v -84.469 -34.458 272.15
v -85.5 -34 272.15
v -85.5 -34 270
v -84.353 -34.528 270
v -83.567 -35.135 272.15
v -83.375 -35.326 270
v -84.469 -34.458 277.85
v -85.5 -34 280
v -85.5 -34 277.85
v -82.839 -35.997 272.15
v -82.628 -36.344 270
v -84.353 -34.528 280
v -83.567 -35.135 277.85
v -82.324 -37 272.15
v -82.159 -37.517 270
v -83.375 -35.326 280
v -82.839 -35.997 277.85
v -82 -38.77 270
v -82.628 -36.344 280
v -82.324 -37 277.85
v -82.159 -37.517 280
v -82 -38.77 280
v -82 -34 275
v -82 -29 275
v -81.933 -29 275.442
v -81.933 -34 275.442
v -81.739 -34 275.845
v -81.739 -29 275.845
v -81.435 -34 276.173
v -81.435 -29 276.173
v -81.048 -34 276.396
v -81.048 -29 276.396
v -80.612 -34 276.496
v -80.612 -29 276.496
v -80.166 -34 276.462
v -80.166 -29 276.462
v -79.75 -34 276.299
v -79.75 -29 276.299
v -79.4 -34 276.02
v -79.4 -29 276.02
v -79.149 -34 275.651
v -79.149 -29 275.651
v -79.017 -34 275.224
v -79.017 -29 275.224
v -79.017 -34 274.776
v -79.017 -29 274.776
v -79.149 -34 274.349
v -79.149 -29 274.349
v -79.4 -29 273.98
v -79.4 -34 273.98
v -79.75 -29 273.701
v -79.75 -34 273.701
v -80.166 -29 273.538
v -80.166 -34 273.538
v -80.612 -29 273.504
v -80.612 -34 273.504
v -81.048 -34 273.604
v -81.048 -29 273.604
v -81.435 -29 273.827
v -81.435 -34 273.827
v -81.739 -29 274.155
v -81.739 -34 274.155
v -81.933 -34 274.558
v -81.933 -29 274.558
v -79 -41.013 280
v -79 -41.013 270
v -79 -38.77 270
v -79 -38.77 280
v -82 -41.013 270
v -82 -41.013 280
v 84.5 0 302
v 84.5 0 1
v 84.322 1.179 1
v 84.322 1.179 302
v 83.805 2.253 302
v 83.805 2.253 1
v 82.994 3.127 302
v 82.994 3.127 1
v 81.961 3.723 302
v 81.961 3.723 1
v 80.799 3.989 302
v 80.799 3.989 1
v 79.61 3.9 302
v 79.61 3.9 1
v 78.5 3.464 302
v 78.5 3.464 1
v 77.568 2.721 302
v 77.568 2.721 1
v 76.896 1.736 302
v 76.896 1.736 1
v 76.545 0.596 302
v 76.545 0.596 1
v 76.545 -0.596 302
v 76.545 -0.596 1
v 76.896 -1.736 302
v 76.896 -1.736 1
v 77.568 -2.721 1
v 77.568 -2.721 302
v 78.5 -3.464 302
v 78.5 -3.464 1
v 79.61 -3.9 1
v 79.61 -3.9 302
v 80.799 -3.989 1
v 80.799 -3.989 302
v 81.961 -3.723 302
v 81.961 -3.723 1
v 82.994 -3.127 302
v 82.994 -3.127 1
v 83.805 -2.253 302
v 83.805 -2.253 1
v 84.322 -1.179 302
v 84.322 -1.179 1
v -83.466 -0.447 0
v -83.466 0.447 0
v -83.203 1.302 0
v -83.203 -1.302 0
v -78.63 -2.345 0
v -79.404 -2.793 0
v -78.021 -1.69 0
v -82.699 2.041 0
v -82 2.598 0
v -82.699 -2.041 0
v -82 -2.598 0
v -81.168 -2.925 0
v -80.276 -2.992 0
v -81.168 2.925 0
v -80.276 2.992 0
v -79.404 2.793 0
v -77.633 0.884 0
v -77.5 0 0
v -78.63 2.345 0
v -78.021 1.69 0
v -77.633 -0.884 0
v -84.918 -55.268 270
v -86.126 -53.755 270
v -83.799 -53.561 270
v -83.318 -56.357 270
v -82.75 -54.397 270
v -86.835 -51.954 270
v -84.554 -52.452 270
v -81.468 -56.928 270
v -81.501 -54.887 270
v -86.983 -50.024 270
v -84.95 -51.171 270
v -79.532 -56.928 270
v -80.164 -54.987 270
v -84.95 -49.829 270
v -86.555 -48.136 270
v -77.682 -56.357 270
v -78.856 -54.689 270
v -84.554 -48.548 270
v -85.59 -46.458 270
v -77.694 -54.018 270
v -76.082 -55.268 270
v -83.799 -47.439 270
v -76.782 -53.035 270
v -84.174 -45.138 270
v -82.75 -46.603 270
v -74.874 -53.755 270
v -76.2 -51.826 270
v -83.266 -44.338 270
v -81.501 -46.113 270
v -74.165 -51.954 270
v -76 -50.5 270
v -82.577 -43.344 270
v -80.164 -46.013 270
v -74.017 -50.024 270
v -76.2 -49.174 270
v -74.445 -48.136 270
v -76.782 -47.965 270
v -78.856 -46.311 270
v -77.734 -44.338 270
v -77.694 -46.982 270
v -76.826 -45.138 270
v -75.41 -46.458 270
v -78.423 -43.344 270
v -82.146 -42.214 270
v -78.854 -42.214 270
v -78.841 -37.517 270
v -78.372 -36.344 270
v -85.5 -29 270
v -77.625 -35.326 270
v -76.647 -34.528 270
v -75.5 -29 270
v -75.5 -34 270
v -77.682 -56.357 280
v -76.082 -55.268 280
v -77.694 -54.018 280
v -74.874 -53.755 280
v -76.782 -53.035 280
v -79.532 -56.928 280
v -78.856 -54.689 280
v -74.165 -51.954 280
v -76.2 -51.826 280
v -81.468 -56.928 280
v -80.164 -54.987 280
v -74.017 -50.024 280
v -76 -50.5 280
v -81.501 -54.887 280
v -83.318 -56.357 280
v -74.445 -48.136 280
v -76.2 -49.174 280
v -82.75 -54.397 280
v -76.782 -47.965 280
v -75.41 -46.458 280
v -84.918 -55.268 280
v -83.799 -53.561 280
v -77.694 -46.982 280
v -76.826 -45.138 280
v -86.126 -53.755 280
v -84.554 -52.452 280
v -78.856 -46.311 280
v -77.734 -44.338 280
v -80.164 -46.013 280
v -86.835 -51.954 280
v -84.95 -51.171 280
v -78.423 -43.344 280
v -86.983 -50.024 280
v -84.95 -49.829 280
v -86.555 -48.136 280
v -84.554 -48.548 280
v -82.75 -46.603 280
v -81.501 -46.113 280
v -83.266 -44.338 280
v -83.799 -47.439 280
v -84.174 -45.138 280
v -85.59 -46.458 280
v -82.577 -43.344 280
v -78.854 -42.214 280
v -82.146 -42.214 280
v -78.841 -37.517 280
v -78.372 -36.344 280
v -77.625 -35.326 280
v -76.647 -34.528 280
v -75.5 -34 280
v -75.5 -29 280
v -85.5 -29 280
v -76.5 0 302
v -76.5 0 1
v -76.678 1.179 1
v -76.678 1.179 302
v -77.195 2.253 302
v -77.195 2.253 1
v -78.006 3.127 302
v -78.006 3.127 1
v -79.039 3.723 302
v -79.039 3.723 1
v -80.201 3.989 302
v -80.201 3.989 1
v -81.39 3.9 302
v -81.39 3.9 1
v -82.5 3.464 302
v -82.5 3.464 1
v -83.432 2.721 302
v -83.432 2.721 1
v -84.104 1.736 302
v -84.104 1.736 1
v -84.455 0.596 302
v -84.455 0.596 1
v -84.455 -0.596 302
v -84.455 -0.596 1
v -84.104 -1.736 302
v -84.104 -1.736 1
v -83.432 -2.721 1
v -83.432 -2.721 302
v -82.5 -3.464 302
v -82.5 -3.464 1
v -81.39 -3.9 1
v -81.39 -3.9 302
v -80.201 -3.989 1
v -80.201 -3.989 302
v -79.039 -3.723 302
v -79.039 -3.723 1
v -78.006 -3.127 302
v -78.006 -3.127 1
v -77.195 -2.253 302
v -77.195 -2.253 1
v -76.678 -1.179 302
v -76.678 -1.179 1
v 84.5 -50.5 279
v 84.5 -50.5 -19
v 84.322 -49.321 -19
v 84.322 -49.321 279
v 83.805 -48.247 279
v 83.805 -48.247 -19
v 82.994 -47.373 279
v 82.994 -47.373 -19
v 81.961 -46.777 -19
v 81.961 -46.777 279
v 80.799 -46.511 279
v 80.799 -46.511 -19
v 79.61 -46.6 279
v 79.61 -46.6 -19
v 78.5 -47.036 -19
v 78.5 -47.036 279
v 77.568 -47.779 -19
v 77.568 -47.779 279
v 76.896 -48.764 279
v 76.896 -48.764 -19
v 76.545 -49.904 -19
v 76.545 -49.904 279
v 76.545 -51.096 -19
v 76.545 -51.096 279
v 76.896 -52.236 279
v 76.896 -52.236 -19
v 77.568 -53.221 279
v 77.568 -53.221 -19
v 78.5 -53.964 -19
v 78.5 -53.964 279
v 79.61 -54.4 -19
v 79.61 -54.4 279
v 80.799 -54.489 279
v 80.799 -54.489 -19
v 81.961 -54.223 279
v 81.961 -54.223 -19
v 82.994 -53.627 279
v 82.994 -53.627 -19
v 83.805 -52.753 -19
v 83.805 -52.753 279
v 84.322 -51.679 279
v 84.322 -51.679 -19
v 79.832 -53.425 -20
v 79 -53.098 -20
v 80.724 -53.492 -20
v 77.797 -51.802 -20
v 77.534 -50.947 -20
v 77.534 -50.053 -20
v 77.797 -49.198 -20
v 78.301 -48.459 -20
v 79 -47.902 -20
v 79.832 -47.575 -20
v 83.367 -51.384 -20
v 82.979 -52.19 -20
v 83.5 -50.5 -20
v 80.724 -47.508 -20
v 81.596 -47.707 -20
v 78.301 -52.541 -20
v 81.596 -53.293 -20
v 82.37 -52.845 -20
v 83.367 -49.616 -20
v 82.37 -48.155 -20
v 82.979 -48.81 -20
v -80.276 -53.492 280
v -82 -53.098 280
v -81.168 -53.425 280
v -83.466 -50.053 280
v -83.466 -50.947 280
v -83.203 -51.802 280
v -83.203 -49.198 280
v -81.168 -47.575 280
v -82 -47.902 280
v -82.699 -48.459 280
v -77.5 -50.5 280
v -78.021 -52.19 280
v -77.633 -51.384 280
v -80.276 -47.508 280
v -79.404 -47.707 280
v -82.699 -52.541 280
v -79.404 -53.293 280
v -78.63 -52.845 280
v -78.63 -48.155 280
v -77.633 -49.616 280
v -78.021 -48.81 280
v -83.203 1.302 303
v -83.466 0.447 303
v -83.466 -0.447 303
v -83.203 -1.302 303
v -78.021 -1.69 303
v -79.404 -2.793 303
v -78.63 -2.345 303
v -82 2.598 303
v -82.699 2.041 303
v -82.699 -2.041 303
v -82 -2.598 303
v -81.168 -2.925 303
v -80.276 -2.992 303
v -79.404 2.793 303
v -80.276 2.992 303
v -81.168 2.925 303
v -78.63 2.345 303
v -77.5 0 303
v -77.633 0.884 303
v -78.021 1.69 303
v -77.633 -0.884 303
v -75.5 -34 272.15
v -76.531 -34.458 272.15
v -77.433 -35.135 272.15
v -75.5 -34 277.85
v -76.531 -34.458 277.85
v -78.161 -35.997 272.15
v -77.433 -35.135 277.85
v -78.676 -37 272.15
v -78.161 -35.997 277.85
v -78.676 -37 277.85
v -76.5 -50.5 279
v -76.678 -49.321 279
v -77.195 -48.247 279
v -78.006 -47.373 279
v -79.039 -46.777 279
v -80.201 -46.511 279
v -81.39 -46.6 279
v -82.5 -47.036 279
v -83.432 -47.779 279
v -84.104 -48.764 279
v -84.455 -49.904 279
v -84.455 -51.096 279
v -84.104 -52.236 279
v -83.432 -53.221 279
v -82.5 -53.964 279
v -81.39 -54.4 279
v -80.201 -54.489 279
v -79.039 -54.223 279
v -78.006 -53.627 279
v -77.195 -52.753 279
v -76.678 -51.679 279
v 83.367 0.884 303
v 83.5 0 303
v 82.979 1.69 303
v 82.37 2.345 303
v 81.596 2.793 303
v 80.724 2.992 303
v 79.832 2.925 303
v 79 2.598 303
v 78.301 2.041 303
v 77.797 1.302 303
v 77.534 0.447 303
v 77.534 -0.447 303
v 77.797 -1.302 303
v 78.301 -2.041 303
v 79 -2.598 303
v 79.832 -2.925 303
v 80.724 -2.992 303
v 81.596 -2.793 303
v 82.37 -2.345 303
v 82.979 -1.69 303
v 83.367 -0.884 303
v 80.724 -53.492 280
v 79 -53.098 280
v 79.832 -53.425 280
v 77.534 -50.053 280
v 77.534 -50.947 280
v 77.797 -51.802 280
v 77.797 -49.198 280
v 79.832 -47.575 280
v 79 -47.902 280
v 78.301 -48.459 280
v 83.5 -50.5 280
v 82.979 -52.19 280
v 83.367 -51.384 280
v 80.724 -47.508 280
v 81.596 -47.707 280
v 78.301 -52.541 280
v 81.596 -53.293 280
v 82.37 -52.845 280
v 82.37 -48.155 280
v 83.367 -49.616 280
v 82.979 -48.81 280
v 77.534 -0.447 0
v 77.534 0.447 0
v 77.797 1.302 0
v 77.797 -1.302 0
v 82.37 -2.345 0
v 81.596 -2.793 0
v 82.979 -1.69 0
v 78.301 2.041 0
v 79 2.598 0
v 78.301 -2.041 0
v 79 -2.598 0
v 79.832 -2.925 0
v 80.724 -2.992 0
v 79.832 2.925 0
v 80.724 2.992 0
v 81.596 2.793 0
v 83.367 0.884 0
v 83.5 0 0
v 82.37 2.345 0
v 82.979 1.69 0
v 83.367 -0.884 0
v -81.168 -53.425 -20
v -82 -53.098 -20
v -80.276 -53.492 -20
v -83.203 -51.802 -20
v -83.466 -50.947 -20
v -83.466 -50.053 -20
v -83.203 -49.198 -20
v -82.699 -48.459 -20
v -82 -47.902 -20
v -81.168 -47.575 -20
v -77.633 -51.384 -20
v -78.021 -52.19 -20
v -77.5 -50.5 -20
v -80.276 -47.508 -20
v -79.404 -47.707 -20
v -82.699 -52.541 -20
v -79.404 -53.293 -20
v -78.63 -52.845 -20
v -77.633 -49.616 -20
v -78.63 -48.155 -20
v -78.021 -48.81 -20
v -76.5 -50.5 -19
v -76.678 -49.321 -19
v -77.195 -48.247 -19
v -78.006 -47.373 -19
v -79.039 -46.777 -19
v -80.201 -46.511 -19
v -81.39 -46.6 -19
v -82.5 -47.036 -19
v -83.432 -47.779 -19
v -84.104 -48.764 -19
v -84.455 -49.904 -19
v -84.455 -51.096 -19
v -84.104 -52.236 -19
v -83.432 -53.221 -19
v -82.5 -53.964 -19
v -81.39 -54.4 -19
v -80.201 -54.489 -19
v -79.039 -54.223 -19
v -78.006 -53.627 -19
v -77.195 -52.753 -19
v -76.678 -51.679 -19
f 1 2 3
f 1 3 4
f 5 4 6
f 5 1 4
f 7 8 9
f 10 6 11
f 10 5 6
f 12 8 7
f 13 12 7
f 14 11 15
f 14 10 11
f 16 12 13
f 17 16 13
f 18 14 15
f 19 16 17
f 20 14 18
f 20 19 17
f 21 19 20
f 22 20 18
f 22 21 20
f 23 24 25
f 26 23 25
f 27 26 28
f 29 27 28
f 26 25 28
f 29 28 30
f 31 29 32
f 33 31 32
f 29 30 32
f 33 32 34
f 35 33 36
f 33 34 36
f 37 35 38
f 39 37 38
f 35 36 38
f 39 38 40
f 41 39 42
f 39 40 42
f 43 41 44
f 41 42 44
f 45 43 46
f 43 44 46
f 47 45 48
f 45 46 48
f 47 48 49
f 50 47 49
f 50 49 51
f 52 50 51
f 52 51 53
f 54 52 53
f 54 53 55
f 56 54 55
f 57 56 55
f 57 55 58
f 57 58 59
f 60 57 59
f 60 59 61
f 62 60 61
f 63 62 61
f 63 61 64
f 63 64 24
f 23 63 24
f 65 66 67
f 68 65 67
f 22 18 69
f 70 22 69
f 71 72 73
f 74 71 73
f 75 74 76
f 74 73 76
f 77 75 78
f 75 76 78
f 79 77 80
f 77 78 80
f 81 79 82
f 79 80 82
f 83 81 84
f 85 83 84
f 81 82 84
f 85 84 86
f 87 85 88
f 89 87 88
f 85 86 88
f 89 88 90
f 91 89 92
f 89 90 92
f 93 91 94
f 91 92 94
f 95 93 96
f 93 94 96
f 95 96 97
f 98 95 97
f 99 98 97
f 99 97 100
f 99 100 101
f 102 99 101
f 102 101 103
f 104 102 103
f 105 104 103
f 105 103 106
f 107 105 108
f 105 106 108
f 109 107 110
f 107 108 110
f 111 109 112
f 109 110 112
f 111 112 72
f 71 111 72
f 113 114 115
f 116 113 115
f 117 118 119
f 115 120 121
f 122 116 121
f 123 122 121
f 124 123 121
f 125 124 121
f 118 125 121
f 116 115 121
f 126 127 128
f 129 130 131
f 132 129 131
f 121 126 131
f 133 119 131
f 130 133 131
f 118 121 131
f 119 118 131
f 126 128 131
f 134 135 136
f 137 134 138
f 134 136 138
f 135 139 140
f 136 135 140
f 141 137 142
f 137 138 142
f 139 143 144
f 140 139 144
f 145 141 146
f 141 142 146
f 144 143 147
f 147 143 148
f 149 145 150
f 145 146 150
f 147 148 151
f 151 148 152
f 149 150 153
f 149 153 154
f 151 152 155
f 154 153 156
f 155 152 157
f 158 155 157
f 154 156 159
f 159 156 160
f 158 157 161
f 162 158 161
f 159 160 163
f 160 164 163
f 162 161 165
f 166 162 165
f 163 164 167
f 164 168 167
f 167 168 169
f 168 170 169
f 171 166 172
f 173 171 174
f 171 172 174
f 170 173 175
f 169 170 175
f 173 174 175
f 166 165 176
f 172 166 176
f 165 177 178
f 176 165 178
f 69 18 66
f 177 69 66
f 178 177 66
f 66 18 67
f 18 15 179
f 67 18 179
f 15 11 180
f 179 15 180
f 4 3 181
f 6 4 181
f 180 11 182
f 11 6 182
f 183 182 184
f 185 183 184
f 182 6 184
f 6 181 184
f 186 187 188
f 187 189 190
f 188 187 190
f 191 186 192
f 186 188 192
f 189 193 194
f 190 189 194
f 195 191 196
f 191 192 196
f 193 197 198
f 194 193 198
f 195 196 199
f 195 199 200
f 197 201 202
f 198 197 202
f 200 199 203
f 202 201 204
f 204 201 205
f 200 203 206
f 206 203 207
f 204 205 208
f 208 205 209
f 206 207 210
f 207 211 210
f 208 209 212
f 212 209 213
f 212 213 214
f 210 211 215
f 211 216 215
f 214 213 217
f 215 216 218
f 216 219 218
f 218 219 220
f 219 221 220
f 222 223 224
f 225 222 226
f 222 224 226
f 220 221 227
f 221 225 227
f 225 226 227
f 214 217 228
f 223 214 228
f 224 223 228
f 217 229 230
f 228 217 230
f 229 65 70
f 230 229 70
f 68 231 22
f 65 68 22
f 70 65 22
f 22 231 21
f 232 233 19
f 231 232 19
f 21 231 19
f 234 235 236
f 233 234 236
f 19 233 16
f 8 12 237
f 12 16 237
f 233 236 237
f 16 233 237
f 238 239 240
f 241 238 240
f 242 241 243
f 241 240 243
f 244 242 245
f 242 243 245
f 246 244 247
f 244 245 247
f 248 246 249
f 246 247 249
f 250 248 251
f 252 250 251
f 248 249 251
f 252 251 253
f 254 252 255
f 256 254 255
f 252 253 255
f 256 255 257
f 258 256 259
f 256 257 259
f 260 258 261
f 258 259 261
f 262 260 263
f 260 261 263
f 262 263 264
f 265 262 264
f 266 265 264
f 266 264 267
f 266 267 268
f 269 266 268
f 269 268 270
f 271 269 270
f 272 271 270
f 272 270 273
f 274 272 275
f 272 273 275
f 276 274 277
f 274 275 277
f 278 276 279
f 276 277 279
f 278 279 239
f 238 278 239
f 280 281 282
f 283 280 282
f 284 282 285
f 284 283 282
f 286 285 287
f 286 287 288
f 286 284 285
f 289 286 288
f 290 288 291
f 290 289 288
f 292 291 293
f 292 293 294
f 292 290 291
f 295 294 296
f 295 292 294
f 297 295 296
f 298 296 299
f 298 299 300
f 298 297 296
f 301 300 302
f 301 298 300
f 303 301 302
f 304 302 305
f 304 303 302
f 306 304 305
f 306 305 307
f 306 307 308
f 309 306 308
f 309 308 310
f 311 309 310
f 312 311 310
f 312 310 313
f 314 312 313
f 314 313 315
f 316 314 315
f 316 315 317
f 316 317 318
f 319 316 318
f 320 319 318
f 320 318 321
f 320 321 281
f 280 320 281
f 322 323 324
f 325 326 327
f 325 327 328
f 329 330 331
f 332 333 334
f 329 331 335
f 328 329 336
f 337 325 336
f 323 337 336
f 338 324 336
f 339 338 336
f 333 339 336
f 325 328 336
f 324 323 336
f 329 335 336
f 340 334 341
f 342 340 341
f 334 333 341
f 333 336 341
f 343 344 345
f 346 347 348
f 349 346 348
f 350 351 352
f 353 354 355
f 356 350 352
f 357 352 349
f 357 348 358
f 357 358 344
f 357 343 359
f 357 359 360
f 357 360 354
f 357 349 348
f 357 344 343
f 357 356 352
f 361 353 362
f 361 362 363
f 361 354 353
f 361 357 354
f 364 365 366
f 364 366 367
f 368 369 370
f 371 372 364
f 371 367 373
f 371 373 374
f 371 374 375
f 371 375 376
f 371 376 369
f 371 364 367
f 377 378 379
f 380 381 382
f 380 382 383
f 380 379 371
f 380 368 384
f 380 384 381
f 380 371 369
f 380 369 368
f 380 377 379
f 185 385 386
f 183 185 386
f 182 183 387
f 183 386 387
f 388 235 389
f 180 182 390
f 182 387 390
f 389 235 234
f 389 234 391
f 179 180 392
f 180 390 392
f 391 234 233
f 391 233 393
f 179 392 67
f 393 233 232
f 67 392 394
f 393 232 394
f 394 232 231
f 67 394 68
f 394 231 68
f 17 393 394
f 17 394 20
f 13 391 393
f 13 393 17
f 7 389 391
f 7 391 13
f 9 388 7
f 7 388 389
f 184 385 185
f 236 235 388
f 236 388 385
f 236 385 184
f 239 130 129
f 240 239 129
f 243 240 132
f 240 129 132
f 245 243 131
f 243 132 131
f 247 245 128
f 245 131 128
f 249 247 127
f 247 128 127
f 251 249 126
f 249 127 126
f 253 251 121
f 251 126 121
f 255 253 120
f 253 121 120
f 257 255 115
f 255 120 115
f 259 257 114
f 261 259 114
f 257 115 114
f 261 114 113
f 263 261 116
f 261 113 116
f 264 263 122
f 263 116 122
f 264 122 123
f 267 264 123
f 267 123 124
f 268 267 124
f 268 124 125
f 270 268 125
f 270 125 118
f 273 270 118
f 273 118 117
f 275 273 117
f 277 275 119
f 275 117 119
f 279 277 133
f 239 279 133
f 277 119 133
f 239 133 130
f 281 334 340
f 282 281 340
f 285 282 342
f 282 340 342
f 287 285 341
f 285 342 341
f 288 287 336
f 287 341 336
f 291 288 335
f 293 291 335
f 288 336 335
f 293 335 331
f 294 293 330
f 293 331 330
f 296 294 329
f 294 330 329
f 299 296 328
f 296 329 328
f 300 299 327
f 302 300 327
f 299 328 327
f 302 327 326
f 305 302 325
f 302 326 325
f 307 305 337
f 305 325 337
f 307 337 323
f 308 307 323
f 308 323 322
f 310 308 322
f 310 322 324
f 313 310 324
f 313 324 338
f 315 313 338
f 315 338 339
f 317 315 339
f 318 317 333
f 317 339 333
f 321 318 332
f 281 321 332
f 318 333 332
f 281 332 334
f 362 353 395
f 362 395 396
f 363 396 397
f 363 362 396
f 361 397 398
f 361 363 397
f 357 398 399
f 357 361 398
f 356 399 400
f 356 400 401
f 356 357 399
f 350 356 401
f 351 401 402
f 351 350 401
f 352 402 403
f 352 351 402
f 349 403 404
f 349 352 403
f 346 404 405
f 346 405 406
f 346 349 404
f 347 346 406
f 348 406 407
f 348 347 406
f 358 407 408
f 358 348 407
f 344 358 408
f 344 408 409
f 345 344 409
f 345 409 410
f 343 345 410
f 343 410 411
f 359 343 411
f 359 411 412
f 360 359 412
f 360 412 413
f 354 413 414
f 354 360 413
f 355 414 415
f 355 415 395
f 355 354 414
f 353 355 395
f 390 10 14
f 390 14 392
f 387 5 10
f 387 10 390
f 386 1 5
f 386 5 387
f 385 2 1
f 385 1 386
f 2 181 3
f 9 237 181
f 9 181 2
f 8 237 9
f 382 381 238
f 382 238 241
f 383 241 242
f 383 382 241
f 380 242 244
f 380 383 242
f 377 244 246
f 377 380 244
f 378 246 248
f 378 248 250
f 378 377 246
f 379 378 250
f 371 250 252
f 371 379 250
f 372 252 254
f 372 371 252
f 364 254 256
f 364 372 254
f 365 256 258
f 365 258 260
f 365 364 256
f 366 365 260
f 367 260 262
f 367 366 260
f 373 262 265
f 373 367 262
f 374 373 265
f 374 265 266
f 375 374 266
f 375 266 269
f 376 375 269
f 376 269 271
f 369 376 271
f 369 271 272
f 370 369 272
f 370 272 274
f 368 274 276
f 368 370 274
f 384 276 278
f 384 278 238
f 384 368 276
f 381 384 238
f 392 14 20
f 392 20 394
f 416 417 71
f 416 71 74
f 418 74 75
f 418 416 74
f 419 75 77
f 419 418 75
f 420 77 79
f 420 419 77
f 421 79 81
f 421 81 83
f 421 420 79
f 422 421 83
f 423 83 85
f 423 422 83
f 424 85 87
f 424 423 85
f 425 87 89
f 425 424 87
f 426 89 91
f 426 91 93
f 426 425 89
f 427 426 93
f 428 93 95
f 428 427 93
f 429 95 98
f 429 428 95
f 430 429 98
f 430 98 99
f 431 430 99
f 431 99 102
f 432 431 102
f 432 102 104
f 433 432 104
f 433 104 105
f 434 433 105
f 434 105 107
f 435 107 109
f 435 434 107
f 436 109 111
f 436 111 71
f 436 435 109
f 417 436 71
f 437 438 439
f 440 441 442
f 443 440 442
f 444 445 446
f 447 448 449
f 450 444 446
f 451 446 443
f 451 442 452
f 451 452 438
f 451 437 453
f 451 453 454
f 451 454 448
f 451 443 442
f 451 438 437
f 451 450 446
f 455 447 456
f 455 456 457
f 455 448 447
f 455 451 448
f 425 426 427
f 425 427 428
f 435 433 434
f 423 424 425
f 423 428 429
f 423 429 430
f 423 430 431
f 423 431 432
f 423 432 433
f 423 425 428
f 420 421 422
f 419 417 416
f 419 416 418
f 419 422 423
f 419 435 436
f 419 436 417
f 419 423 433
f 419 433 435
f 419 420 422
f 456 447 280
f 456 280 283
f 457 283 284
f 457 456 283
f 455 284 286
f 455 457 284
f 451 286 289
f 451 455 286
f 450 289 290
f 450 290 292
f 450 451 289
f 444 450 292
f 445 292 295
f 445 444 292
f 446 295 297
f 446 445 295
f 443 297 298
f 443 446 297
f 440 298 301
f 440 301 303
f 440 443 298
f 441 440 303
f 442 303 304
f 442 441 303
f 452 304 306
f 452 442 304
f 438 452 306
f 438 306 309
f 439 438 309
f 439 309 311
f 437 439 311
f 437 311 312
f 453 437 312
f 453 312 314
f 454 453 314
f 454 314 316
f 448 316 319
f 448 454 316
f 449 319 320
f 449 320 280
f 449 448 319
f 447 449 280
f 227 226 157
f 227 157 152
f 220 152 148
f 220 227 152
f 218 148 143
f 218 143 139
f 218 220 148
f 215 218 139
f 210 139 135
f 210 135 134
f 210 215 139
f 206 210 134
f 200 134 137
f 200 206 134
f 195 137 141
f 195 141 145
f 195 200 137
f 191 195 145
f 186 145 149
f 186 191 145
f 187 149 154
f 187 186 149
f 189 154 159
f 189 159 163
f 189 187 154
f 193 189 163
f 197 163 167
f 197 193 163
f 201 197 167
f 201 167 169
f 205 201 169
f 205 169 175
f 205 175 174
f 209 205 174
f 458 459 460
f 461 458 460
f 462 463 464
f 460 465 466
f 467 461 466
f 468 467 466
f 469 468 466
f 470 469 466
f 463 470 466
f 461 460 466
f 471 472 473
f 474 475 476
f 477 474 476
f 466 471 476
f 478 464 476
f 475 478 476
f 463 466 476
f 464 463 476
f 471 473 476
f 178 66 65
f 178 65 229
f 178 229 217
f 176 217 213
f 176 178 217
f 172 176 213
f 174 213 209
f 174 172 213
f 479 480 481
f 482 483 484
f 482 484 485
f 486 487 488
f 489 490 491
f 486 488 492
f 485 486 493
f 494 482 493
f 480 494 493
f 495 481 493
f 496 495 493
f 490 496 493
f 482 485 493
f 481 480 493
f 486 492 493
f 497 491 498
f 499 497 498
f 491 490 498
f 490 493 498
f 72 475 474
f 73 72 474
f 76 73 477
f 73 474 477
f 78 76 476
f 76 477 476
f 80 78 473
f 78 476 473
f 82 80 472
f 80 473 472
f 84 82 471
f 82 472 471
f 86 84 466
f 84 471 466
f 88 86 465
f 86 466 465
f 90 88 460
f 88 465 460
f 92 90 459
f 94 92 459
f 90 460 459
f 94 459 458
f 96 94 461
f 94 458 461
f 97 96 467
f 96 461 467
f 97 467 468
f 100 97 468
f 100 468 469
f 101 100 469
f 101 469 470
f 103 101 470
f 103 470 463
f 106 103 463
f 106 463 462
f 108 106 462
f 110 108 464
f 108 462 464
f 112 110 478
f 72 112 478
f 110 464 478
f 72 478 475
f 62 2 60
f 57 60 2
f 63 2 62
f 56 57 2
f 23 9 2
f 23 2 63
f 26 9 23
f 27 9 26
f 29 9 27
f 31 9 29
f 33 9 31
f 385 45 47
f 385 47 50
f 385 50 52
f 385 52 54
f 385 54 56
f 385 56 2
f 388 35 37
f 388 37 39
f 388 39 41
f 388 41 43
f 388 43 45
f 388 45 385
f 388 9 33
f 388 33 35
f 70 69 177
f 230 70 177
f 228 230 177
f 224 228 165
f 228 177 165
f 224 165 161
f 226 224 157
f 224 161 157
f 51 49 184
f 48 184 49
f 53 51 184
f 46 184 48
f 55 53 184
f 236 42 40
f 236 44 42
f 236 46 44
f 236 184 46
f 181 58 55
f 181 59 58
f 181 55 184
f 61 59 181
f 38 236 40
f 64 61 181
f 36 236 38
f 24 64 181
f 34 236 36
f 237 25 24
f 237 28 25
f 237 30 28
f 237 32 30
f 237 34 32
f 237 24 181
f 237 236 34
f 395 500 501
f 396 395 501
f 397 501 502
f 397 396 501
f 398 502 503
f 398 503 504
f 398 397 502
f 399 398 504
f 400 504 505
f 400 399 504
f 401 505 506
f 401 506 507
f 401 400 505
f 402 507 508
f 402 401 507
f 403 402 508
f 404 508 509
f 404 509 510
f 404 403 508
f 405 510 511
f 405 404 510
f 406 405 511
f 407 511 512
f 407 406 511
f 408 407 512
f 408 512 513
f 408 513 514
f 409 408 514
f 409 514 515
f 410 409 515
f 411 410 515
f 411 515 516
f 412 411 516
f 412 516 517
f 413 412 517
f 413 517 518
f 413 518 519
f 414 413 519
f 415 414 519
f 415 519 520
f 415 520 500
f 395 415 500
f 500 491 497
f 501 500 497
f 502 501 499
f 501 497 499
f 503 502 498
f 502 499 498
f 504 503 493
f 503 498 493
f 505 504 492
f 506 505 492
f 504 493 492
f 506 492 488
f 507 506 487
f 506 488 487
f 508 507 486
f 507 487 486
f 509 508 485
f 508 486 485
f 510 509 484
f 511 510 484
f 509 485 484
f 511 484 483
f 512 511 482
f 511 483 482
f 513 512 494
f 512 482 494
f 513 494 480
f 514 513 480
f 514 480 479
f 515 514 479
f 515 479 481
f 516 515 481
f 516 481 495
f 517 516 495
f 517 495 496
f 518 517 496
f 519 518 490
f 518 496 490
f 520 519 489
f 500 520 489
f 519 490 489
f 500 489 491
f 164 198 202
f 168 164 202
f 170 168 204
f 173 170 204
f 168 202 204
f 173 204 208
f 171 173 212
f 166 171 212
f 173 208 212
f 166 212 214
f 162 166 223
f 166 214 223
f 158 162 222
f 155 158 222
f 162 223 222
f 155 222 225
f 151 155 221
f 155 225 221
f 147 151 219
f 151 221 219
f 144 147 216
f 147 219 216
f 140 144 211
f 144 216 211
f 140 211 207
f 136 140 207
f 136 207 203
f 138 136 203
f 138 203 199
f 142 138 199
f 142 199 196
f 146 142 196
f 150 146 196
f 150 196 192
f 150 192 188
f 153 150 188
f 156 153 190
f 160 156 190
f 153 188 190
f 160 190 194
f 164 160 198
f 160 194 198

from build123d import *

# Parameters (mm, degrees)
F0_R          = 4
F1_DEPTH      = 303
F2_SIZE       = 1
F2_2_SIZE     = 1
F3_R          = 4
F4_DEPTH      = 280
F4_DEPTH_BACK = 20
F5_SIZE       = 1
F5_2_SIZE     = 1
F6_R          = 4.5
F7_DEPTH      = 10
F9_W          = 3
F9_H          = 5.7
F10_DEPTH     = 3
F8_R          = 1.5
F11_DEPTH     = 7
F12_T1_DEPTH  = 2.15
F12_T3_DEPTH  = 10
F12_T8_DEPTH  = 25.9984800354
F12_T15_DEPTH = 25.9984800354
F12_T21_DEPTH = 25.9984800354
F12_T28_DEPTH = 25.9984800354


# Not quite as in the source:
# - a fillet or chamfer that OpenCascade refuses, or shapes differently, is made with other operations: its cross-section is extruded or revolved along the edge and cut away or added


with BuildPart() as f1:
    # F0 (on Top) → F1 (new body)
    with BuildSketch(Plane.XY):
        with Locations((-80.5, 0)):
            Circle(F0_R)
    extrude(amount=F1_DEPTH)

    # F2
    f2_edges = [f1.edges().sort_by_distance(p)[0] for p in [
        (-84.5, 0, 0),
        (-84.5, 0, 303),
    ]]
    chamfer(f2_edges, length=F2_SIZE)


with BuildPart() as f1b:
    # F0 (on Top) → F1, piece 2 (new body)
    with BuildSketch(Plane.XY):
        with Locations((80.5, 0)):
            Circle(F0_R)
    extrude(amount=F1_DEPTH)

    # F2#2
    f2_2_edges = [f1b.edges().sort_by_distance(p)[0] for p in [
        (76.5, 0, 0),
        (76.5, 0, 303),
    ]]
    chamfer(f2_2_edges, length=F2_2_SIZE)


with BuildPart() as f4:
    # F3 (on Top) → F4 (new body, two sides)
    with BuildSketch(Plane.XY) as f4_sk:
        with Locations((-80.5, -50.5)):
            Circle(F3_R)
    extrude(amount=F4_DEPTH)
    extrude(f4_sk.sketch, amount=-F4_DEPTH_BACK)

    # F5
    f5_edges = [f4.edges().sort_by_distance(p)[0] for p in [
        (-84.5, -50.5, 280),
        (-84.5, -50.5, -20),
    ]]
    chamfer(f5_edges, length=F5_SIZE)


with BuildPart() as f4b:
    # F3 (on Top) → F4, piece 2 (new body, two sides)
    with BuildSketch(Plane.XY) as f4_2_sk:
        with Locations((80.5, -50.5)):
            Circle(F3_R)
    extrude(amount=F4_DEPTH)
    extrude(f4_2_sk.sketch, amount=-F4_DEPTH_BACK)

    # F5#2
    f5_2_edges = [f4b.edges().sort_by_distance(p)[0] for p in [
        (76.5, -50.5, 280),
        (76.5, -50.5, -20),
    ]]
    chamfer(f5_2_edges, length=F5_2_SIZE)


with BuildPart() as f7:
    # F6 (on face) → F7 (new body)
    with BuildSketch(Plane.XY.offset(280)):
        with BuildLine():
            Line((-82, -34), (-82, -44.1754446797))
            ThreePointArc((-82, -44.1754446797), (-80.5, -57), (-79, -44.1754446797))
            Line((-79, -44.1754446797), (-79, -34))
            Line((-79, -34), (-75.5, -34))
            Line((-75.5, -34), (-75.5, -29))
            Line((-75.5, -29), (-85.5, -29))
            Line((-85.5, -29), (-85.5, -34))
            Line((-85.5, -34), (-82, -34))
        make_face()
        with Locations((-80.5, -50.5)):
            Circle(F6_R, mode=Mode.SUBTRACT)
    extrude(amount=-F7_DEPTH)

    # F9 (on face) → F10 (cut, through all)
    with BuildSketch(Plane.YZ.offset(-79)):
        with Locations((-35.5, 275)):
            Rectangle(F9_W, F9_H)
    extrude(amount=-F10_DEPTH, mode=Mode.SUBTRACT)

    # F8 (on face) → F11 (cut)
    with BuildSketch(Plane(origin=(0, -29, 0), x_dir=(-1, 0, 0), z_dir=(0, 1, 0))):
        with Locations((80.5, 275)):
            Circle(F8_R)
    extrude(amount=-F11_DEPTH, mode=Mode.SUBTRACT)

    # F12: fillet of radius 5 on 4 edges, made by hand

    # F12_s2 → F12_t1 (join)
    with BuildSketch(Plane.XY.offset(277.85)):
        with BuildLine():
            ThreePointArc((-75.5, -34), (-78.0311288741, -35.8116561155), (-79, -38.7696960071))
            Line((-79, -38.7696960071), (-79, -34))
            Line((-79, -34), (-75.5, -34))
        make_face()
        with BuildLine():
            ThreePointArc((-85.5, -34), (-82.9688711259, -35.8116561155), (-82, -38.7696960071))
            Line((-82, -38.7696960071), (-82, -34))
            Line((-82, -34), (-85.5, -34))
        make_face()
    extrude(amount=F12_T1_DEPTH)

    # F12_s4 → F12_t3 (join)
    with BuildSketch(Plane.XY.offset(270)):
        with BuildLine():
            ThreePointArc((-79, -41.0131670195), (-78.4232586846, -43.3444290401), (-76.8260869565, -45.137877011))
            ThreePointArc((-76.8260869565, -45.137877011), (-77.8686670596, -44.5564247328), (-79, -44.1754446797))
            Line((-79, -44.1754446797), (-79, -41.0131670195))
        make_face()
        with BuildLine():
            ThreePointArc((-82, -41.0131670195), (-82.5767413154, -43.3444290401), (-84.1739130435, -45.137877011))
            ThreePointArc((-84.1739130435, -45.137877011), (-83.1313329404, -44.5564247328), (-82, -44.1754446797))
            Line((-82, -44.1754446797), (-82, -41.0131670195))
        make_face()
    extrude(amount=F12_T3_DEPTH)


with BuildPart() as f12_tool6:
    # F12_s7 → F12_t8 (new body)
    with BuildSketch(Plane.XY.offset(291.9242400177)):
        with BuildLine():
            ThreePointArc((-75.5, -34), (-78.0311288741, -35.8116561155), (-79, -38.7696960071))
            Line((-79, -38.7696960071), (-79, -34))
            Line((-79, -34), (-75.5, -34))
        make_face()
    extrude(amount=-F12_T8_DEPTH)

    split(bisect_by=Plane.XY.offset(270), keep=Keep.TOP)

    split(bisect_by=Plane.XY.offset(277.85), keep=Keep.BOTTOM)

    split(bisect_by=Plane.XZ.offset(37), keep=Keep.TOP)


with BuildPart() as f7_1:
    add(f7.part)

    # F12_t5: union F12_tool6
    add(f12_tool6.part)


with BuildPart() as f12_tool13:
    # F12_s14 → F12_t15 (new body)
    with BuildSketch(Plane.XY.offset(291.9242400177)):
        with BuildLine():
            ThreePointArc((-75.5, -34), (-78.0311288741, -35.8116561155), (-79, -38.7696960071))
            Line((-79, -38.7696960071), (-79, -34))
            Line((-79, -34), (-75.5, -34))
        make_face()
    extrude(amount=-F12_T15_DEPTH)

    split(bisect_by=Plane.XY.offset(270), keep=Keep.TOP)

    split(bisect_by=Plane.XY.offset(272.15), keep=Keep.BOTTOM)


with BuildPart() as f7_2:
    add(f7_1.part)

    # F12_t12: union F12_tool13
    add(f12_tool13.part)


with BuildPart() as f12_tool19:
    # F12_s20 → F12_t21 (new body)
    with BuildSketch(Plane.XY.offset(291.9242400177)):
        with BuildLine():
            ThreePointArc((-85.5, -34), (-82.9688711259, -35.8116561155), (-82, -38.7696960071))
            Line((-82, -38.7696960071), (-82, -34))
            Line((-82, -34), (-85.5, -34))
        make_face()
    extrude(amount=-F12_T21_DEPTH)

    split(bisect_by=Plane.XY.offset(270), keep=Keep.TOP)

    split(bisect_by=Plane.XY.offset(277.85), keep=Keep.BOTTOM)

    split(bisect_by=Plane.XZ.offset(37), keep=Keep.TOP)


with BuildPart() as f7_3:
    add(f7_2.part)

    # F12_t18: union F12_tool19
    add(f12_tool19.part)


with BuildPart() as f12_tool26:
    # F12_s27 → F12_t28 (new body)
    with BuildSketch(Plane.XY.offset(291.9242400177)):
        with BuildLine():
            ThreePointArc((-85.5, -34), (-82.9688711259, -35.8116561155), (-82, -38.7696960071))
            Line((-82, -38.7696960071), (-82, -34))
            Line((-82, -34), (-85.5, -34))
        make_face()
    extrude(amount=-F12_T28_DEPTH)

    split(bisect_by=Plane.XY.offset(270), keep=Keep.TOP)

    split(bisect_by=Plane.XY.offset(272.15), keep=Keep.BOTTOM)


with BuildPart() as f7_4:
    add(f7_3.part)

    # F12_t25: union F12_tool26
    add(f12_tool26.part)


solid = Compound([f1.part, f1b.part, f4.part, f4b.part, f7_4.part])
